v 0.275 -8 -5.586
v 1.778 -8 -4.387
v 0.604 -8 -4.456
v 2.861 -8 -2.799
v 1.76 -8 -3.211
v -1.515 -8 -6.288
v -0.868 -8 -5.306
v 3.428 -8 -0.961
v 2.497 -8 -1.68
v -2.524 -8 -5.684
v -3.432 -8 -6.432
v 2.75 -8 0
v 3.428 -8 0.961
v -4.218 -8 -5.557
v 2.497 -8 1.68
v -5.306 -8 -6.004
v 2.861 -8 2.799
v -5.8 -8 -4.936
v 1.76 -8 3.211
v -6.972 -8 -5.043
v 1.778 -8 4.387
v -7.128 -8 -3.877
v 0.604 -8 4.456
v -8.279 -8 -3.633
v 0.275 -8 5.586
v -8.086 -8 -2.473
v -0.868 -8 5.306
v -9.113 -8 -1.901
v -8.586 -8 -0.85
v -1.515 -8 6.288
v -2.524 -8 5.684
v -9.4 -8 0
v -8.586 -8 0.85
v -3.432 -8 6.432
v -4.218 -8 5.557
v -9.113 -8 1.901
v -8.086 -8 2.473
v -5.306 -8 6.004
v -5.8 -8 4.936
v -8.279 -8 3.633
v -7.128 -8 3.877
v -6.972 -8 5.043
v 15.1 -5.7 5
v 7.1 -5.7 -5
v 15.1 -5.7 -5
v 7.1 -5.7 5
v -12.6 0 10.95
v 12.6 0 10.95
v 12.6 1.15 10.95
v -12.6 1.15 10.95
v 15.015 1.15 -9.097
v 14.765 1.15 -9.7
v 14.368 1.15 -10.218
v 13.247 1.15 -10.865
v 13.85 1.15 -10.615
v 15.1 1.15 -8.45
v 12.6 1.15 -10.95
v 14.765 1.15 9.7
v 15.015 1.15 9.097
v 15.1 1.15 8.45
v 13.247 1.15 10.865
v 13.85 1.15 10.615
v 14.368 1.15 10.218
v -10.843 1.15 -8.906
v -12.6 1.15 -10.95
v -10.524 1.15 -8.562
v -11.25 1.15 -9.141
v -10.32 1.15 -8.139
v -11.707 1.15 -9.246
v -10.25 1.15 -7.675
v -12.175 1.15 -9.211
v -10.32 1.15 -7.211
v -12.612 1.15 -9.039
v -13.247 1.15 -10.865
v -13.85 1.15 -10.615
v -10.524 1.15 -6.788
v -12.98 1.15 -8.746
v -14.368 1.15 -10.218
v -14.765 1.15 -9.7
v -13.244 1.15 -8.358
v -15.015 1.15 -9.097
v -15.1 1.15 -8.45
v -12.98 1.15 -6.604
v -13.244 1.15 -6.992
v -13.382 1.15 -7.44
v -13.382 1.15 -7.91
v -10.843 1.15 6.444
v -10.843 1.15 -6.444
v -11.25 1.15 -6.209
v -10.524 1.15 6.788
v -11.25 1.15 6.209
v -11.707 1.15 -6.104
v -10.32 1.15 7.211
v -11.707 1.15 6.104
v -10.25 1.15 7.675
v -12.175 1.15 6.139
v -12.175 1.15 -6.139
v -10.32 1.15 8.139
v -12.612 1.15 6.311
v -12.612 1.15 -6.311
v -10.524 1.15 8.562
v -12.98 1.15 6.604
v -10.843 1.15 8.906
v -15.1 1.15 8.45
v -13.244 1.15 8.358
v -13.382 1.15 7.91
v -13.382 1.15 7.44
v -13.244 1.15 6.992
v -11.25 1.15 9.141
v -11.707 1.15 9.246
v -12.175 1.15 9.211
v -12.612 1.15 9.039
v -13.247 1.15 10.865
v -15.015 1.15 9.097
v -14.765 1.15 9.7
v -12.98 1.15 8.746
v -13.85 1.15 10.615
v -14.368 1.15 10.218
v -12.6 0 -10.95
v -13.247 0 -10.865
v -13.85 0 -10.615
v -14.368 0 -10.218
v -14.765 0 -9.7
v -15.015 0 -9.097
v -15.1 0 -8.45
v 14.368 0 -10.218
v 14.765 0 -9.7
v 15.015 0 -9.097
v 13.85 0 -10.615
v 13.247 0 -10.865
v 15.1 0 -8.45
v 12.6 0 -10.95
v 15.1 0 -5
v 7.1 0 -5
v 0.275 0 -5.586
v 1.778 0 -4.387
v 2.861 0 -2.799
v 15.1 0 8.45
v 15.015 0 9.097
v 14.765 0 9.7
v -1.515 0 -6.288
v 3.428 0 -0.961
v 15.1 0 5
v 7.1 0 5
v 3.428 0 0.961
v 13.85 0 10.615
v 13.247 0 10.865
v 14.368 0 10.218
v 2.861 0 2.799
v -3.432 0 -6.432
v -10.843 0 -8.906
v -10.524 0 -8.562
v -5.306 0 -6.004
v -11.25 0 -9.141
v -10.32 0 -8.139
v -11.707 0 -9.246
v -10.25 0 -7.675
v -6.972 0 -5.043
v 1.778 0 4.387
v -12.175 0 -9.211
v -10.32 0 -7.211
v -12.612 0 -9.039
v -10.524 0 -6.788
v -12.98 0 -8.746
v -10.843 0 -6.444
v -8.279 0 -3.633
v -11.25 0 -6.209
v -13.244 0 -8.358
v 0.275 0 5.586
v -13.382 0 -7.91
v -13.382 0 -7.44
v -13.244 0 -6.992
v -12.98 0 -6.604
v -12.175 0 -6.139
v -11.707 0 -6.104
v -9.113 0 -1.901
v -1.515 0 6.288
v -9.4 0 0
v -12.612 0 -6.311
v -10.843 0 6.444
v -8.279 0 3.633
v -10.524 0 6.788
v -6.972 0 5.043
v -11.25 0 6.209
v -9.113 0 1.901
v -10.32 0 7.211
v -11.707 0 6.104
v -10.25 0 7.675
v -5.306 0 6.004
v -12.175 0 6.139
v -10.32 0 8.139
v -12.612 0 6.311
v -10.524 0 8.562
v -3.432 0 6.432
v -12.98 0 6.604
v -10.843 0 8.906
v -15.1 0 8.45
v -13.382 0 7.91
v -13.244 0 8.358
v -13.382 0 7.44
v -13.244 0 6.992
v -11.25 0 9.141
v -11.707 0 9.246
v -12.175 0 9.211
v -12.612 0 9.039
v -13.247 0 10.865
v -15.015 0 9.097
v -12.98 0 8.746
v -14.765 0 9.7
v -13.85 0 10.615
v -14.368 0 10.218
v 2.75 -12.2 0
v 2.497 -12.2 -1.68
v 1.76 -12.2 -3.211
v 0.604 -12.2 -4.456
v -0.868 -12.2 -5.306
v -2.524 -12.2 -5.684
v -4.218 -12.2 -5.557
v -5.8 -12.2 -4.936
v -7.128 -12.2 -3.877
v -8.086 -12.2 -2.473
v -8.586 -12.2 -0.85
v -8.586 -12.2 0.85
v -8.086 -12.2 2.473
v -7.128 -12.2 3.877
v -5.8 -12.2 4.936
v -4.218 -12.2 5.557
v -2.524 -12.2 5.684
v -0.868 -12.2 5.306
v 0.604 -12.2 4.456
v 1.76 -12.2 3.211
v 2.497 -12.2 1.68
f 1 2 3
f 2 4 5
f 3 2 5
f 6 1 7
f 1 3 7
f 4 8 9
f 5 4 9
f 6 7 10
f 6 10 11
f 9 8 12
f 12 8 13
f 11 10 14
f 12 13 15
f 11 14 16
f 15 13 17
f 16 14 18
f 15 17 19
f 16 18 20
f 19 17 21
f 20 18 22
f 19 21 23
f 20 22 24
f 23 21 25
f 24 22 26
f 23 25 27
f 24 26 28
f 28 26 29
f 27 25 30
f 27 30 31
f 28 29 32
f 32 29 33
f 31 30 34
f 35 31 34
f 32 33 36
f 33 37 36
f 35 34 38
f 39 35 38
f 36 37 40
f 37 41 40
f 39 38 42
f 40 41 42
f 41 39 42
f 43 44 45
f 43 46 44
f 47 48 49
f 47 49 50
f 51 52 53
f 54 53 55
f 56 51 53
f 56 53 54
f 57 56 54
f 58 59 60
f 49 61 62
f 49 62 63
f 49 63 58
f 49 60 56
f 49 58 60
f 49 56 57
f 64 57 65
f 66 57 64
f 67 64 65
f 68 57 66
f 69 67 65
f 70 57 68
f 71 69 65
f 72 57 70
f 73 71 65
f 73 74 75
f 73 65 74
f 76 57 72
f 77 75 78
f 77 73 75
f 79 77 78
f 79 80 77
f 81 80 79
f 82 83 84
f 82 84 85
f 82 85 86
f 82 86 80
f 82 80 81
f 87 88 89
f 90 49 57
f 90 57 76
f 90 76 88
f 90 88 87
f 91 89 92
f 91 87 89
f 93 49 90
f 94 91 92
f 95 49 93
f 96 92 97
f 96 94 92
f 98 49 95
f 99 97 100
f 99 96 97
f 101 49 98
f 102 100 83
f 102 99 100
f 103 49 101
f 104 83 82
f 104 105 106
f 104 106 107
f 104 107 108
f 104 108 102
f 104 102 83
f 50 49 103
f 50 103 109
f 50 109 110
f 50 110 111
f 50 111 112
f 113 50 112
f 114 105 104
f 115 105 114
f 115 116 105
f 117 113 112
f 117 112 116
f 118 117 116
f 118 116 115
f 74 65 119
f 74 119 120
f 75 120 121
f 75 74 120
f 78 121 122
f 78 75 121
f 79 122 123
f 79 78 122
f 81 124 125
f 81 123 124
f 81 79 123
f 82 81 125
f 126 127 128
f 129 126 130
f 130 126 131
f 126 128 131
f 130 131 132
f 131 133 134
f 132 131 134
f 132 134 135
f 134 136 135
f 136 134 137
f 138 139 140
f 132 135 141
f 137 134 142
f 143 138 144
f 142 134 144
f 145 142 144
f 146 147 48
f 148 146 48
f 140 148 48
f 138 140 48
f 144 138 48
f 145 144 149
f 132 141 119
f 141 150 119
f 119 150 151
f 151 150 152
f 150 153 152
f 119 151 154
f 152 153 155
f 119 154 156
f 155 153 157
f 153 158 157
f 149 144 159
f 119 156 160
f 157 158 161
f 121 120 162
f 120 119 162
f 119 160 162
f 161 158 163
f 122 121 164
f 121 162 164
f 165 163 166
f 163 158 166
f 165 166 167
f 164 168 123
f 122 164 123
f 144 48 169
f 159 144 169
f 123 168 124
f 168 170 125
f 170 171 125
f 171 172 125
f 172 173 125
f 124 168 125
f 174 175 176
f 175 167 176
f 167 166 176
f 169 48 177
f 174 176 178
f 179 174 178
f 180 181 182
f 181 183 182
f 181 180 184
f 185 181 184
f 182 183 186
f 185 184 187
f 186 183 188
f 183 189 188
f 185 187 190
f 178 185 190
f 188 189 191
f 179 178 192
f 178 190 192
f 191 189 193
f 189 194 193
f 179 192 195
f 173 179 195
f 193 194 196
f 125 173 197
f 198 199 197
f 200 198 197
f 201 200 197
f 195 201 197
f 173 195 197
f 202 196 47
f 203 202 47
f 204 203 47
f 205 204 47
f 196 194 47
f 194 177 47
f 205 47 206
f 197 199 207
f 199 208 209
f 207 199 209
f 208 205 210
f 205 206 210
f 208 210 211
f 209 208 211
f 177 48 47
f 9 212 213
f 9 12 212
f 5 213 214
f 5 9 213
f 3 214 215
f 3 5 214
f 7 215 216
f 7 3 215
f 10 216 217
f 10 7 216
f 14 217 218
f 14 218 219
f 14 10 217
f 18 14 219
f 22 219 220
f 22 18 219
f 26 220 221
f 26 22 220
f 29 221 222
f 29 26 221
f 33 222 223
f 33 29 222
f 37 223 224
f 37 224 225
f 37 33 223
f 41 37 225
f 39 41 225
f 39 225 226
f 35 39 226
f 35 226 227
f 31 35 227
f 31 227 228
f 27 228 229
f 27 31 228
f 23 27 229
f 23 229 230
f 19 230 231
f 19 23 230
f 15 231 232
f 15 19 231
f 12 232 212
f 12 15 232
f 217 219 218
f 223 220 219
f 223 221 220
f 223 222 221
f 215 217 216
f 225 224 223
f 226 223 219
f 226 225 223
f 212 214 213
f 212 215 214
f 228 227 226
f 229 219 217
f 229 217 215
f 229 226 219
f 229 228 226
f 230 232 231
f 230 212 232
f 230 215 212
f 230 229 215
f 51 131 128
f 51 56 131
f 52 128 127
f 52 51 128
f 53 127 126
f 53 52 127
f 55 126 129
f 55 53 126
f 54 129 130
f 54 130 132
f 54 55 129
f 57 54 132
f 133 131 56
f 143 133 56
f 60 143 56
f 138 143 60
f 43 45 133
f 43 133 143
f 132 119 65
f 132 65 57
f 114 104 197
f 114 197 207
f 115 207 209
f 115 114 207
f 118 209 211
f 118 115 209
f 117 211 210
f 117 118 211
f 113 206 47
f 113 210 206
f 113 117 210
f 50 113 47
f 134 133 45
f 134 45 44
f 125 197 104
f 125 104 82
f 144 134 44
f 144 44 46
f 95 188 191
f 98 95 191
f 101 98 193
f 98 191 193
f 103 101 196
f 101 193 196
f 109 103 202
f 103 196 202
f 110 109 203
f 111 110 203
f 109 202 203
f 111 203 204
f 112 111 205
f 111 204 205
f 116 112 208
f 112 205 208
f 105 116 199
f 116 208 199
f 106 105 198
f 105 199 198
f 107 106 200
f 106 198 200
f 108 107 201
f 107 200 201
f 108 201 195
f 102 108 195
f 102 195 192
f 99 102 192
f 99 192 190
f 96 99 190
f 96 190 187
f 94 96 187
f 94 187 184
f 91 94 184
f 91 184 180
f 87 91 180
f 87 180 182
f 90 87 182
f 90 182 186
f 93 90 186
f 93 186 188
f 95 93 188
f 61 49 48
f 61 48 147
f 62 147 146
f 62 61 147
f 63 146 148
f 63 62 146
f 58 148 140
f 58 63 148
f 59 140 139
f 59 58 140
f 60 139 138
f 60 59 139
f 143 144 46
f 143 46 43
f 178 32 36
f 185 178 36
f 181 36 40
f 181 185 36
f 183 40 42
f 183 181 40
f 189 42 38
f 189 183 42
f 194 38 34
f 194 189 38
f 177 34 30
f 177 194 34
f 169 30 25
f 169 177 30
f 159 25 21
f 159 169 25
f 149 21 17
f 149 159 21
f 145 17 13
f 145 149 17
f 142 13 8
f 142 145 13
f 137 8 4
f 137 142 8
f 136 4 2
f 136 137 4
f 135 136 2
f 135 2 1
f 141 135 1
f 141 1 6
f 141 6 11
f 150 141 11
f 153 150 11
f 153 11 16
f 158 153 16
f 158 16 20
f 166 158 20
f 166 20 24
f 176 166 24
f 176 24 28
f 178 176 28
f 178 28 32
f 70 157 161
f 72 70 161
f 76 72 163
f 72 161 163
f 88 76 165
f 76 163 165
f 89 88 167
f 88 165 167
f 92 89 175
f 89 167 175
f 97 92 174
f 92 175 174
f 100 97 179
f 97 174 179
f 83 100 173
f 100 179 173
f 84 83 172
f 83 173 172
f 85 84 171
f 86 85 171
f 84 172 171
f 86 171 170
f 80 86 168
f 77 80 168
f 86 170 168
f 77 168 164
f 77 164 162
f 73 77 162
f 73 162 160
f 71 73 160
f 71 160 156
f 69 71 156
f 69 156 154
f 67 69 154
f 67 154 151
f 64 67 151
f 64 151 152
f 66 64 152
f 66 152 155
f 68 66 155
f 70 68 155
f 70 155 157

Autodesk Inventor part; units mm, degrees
ref_plane "YZ Plane" through (0, 0, 0) normal (1, 0, 0) x (0, 1, 0)
ref_plane "XZ Plane" through (0, 0, 0) normal (0, 1, 0) x (-1, 0, 0)
ref_plane "XY Plane" through (0, 0, 0) normal (0, 0, 1) x (1, 0, 0)
sketch "Sketch1" plane through (0, 0, 0) normal (0, 1, 0) x (-1, 0, 0)
  line L0 (-15.1, 10.95) -> (15.1, 10.95)
  line L1 (15.1, 10.95) -> (15.1, -10.95)
  line L2 (15.1, -10.95) -> (-15.1, -10.95)
  line L3 (-15.1, -10.95) -> (-15.1, 10.95)
  line L4 (-15.1, 10.95) -> (15.1, -10.95) construction
  line L5 (15.1, 10.95) -> (-15.1, -10.95) construction
  line L6 (-3.5, 6.45) -> (9.4, 6.45)
  line L7 (9.4, 6.45) -> (9.4, -6.45)
  line L8 (9.4, -6.45) -> (-3.5, -6.45)
  line L9 (-3.5, -6.45) -> (-3.5, 6.45)
  line L10 (-3.5, 6.45) -> (9.4, -6.45) construction
  line L11 (9.4, 6.45) -> (-3.5, -6.45) construction
  circle A0 centre (2.95, 0) radius 6.45
  point P0 (0, 0)
  dimension "d0" = 21.9
  dimension "d1" = 30.2
  dimension "d3" = 12.9
  dimension "d4" = 18.6
extrude "Extrusion1" add sketch "Sketch1" along normal blind 1.15 contours L0 L1 L2 L3 | L6 A0 L9 | L6 L7 A0 | A0 | A0 L8 L9 | L7 L8 A0
extrude "Extrusion2" add sketch "Sketch1" against normal blind 8 contours A0
sketch "Sketch2" plane through (0, -8, 0) normal (0, -1, 0) x (1, 0, 0)
  line L0 (3.5, -6.45) -> (3.5, 6.45) projected
  line L1 (3.5, 6.45) -> (-9.4, 6.45) projected
  line L2 (-9.4, 6.45) -> (-9.4, -6.45) projected
  line L3 (-9.4, -6.45) -> (3.5, -6.45) projected
  line L4 (3.5, 6.45) -> (-9.4, -6.45)
  line L5 (3.5, -6.45) -> (-9.4, 6.45)
  circle A0 centre (-2.95, 0) radius 5.7
  point P0 (0, 0)
  dimension "d9" = 11.4
extrude "Extrusion3" add sketch "Sketch2" along normal blind 4.2 contours A0 L4 L5 | L5 L4 A0 | L4 L5 A0 | A0 L5 L4
sketch "Sketch3" plane through (0, 0, 0) normal (0, -1, 0) x (1, 0, 0)
  line L0 (15.1, -10.95) -> (-15.1, -10.95) projected
  line L1 (15.1, 10.95) -> (15.1, -10.95) projected
  line L2 (-15.1, 10.95) -> (15.1, 10.95) projected
  line L3 (-15.1, -10.95) -> (-15.1, 10.95) projected
  line L4 (15.1, -5) -> (7.1, -5)
  line L5 (7.1, -5) -> (7.1, 5)
  line L6 (7.1, 5) -> (15.1, 5)
  line L7 (15.1, 5) -> (15.1, -5)
  line L8 (15.1, -5) -> (7.1, 5) construction
  line L9 (7.1, -5) -> (15.1, 5) construction
  line L10 (15.1, 10.95) -> (15.1, -10.95) projected
  point P0 (0, 0)
  point P1 (11.1, 0)
  point P2 (15.1, 0)
  dimension "d12" = 10
  dimension "d13" = 8
extrude "Extrusion4" add sketch "Sketch3" along normal blind 5.7 contours L4 L5 L6 L1
sketch "Sketch4" plane through (0, 0, 0) normal (0, -1, 0) x (1, 0, 0)
  line L0 (7.1, 5) -> (15.1, 5) projected
  line L1 (15.1, 10.95) -> (15.1, 5) projected
  line L2 (-15.1, 10.95) -> (15.1, 10.95) projected
  line L3 (-15.1, -10.95) -> (-15.1, 10.95) projected
  line L4 (15.1, -10.95) -> (-15.1, -10.95) projected
  line L5 (15.1, -5) -> (15.1, -10.95) projected
  line L6 (15.1, -5) -> (7.1, -5) projected
  line L7 (7.1, -5) -> (7.1, 5) projected
  circle A0 centre (-11.825, -7.675) radius 1.575
  circle A1 centre (-11.825, 7.675) radius 1.575
  line L8 (-10.25, -9.6033) -> (-10.25, -6.1)
  line L9 (-10.25, -6.1) -> (-13.9455, -6.1)
  point P0 (0, 0)
  dimension "d16" = 3.15
  dimension "d17" = 3.15
  dimension "d18" = 4.85
  dimension "d19" = 3.275
  dimension "d20" = 3.275
  dimension "d21" = 4.85
extrude "Extrusion5" cut sketch "Sketch4" against normal through all contours A0 | A1
fillet "Fillet1" radius 2.5 4 edges at (-15.1, 0.575, -10.95) (-15.1, 0.575, 10.95) (15.1, 0.575, -10.95) (15.1, 0.575, 10.95)
sketch "Sketch5" plane through (0, 0, 0) normal (0, -1, 0) x (1, 0, 0)
  circle A0 centre (-11.825, 7.675) radius 1.575 projected
  circle A1 centre (-11.825, -7.675) radius 1.575 projected
  arc A2 (15.1, 8.45) -> (12.6, 10.95) centre (12.6, 8.45) ccw projected
  line L0 (-12.6, 10.95) -> (12.6, 10.95) projected
  arc A3 (-12.6, 10.95) -> (-15.1, 8.45) centre (-12.6, 8.45) ccw projected
  line L1 (-15.1, -8.45) -> (-15.1, 8.45) projected
  arc A4 (-15.1, -8.45) -> (-12.6, -10.95) centre (-12.6, -8.45) ccw projected
  line L2 (12.6, -10.95) -> (-12.6, -10.95) projected
  arc A5 (12.6, -10.95) -> (15.1, -8.45) centre (12.6, -8.45) ccw projected
  line L3 (15.1, -5) -> (15.1, -8.45) projected
  line L4 (15.1, -5) -> (7.1, -5) projected
  line L5 (7.1, -5) -> (7.1, 5) projected
  line L6 (7.1, 5) -> (15.1, 5) projected
  line L7 (15.1, 8.45) -> (15.1, 5) projected
  line L8 (-15.1, -8.45) -> (-15.1, -10.95)
  line L9 (-15.1, -10.95) -> (-12.6, -10.95)
  line L10 (-14.9891, 11.1013) -> (15.1, 10.95) construction
  line L11 (15.1, 10.95) -> (14.9891, -11.1013) construction
  line L12 (14.9891, -11.1013) -> (-15.1, -10.95) construction
  line L13 (-15.1, -10.95) -> (-14.9891, 11.1013) construction
  line L14 (12.6, 10.95) -> (15.1, 10.95)
  line L15 (15.1, 10.95) -> (15.1, 8.45)
  point P0 (0, 0)
decal "Decal1"
decal "Decal2"
decal "Decal3"
decal "Decal4"
equation "\"d20\" = d19"
equation "\"d21\" = d18"
properties part number "DF Robot DFR0029-R"
